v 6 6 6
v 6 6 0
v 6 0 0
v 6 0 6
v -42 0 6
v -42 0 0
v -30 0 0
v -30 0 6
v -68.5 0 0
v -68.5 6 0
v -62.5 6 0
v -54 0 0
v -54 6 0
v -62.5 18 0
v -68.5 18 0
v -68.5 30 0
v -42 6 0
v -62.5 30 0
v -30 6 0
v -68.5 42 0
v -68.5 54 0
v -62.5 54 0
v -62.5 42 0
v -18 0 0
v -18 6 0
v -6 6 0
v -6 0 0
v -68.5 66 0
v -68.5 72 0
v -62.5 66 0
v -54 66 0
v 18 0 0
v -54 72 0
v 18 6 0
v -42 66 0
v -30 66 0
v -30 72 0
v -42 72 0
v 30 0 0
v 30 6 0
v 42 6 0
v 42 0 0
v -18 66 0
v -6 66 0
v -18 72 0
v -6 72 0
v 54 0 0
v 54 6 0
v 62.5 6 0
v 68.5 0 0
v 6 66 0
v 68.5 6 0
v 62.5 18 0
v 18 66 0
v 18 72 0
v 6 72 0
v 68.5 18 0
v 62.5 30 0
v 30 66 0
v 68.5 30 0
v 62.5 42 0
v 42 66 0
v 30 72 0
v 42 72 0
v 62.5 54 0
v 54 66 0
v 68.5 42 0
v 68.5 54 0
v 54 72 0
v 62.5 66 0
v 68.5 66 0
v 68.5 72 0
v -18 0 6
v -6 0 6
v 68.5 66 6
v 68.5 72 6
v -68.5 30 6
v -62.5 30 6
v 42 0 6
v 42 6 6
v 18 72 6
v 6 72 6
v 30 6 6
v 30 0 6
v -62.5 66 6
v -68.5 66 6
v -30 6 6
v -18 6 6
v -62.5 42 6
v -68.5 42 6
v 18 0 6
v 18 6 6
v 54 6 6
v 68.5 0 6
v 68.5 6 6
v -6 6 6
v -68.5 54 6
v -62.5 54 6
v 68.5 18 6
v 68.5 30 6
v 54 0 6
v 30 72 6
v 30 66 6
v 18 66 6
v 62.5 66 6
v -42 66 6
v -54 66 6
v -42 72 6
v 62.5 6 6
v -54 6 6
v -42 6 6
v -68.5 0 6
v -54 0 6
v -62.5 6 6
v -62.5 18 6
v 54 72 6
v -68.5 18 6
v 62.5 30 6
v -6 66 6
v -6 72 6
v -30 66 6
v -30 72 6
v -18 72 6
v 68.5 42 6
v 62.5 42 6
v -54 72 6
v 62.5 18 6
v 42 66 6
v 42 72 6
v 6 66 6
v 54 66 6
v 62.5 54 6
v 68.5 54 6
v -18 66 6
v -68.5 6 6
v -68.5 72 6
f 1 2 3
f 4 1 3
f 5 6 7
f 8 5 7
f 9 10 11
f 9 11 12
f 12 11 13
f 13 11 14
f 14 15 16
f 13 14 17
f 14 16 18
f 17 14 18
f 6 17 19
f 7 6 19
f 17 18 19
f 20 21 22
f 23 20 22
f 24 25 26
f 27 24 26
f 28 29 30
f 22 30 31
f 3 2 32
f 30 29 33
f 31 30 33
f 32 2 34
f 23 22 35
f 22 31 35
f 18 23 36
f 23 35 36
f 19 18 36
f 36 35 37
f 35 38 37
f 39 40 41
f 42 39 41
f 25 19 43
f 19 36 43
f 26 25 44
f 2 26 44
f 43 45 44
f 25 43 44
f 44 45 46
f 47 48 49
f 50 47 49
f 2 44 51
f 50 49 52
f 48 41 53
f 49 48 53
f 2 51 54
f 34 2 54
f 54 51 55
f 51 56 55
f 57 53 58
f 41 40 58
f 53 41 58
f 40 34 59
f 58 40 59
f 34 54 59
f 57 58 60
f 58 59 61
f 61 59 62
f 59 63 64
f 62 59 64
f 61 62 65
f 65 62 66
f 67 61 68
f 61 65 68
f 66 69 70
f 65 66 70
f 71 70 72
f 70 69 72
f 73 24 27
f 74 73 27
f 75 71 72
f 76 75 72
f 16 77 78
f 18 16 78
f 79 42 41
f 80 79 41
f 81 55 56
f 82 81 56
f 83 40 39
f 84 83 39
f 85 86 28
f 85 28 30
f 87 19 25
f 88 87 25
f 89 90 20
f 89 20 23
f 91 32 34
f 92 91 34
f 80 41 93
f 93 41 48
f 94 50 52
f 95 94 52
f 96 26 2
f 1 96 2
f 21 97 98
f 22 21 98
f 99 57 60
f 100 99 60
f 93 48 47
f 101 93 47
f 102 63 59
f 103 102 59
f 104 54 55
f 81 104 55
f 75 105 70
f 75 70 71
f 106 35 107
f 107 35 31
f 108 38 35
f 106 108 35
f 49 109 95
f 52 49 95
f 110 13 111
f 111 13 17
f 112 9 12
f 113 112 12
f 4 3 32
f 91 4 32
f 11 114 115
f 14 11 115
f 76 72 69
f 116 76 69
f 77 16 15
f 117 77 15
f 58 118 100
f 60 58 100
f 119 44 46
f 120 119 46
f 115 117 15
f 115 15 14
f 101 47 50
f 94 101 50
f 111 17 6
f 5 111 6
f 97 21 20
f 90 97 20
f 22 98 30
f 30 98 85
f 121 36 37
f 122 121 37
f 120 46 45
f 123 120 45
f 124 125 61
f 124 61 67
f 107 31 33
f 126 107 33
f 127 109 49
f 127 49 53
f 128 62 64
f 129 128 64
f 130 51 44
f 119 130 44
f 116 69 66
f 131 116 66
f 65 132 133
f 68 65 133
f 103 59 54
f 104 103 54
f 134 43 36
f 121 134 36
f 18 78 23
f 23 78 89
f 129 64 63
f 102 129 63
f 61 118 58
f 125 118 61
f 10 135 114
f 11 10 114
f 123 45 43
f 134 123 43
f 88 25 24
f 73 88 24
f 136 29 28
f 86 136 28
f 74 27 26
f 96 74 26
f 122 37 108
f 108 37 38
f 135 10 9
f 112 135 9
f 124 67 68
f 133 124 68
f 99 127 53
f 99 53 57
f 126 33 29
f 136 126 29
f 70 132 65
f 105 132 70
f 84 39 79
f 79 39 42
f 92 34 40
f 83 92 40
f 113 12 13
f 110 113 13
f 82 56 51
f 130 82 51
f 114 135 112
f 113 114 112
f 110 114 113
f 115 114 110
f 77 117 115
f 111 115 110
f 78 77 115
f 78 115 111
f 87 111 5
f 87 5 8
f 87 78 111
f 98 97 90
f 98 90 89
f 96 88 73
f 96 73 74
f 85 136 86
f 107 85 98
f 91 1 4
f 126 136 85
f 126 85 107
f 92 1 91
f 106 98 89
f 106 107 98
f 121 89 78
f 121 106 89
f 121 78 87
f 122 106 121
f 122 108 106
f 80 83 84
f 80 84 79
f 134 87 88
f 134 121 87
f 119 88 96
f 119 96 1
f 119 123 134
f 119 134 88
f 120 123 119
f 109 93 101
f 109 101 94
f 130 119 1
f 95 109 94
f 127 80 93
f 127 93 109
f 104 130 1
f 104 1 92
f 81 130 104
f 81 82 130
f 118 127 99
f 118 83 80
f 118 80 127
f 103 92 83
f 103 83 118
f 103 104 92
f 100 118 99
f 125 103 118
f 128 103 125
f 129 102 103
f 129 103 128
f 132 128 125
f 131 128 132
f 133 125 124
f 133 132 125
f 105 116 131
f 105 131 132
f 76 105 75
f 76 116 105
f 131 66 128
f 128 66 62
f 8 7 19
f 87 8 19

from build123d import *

# Parameters (mm, degrees)
SKETCH2_W           = 8.5
SKETCH2_H           = 6
BOSS_EXTRUDE1_DEPTH = 6
SKETCH3_W           = 6
SKETCH3_H           = 12
CUT_EXTRUDE1_DEPTH  = 6


with BuildPart() as part:
    # Sketch2 → Boss-Extrude1 (new body)
    with BuildSketch(Plane.XY):
        with Locations((-58.25, 3)):
            Rectangle(SKETCH2_W, SKETCH2_H)
        Polygon((-68.5, 72), (-68.5, 0), (-62.5, 0), (-62.5, 6), (-54, 6), (-42, 6), (-42, 0), (-30, 0), (-30, 6), (-18, 6), (-18, 0), (-6, 0), (-6, 6), (6, 6), (6, 0), (18, 0), (18, 6), (30, 6), (30, 0), (42, 0), (42, 6), (54, 6), (54, 0), (68.5, 0), (68.5, 72), (54, 72), (54, 66), (42, 66), (42, 72), (30, 72), (30, 66), (18, 66), (18, 72), (6, 72), (6, 66), (-6, 66), (-6, 72), (-18, 72), (-18, 66), (-30, 66), (-30, 72), (-42, 72), (-42, 66), (-54, 66), (-54, 72), align=None)
    extrude(amount=BOSS_EXTRUDE1_DEPTH)

    # Sketch3 → Cut-Extrude1 (cut)
    with BuildSketch(Plane.XY.offset(6)):
        with Locations((-65.5, 60)):
            Rectangle(SKETCH3_W, SKETCH3_H)
        with Locations((-65.5, 12)):
            Rectangle(SKETCH3_W, SKETCH3_H)
        with Locations((65.5, 36)):
            Rectangle(SKETCH3_W, SKETCH3_H)
        with Locations((65.5, 12)):
            Rectangle(SKETCH3_W, SKETCH3_H)
        with Locations((-65.5, 36)):
            Rectangle(SKETCH3_W, SKETCH3_H)
        with Locations((65.5, 60)):
            Rectangle(SKETCH3_W, SKETCH3_H)
    extrude(amount=-CUT_EXTRUDE1_DEPTH, mode=Mode.SUBTRACT)


solid = part.part
